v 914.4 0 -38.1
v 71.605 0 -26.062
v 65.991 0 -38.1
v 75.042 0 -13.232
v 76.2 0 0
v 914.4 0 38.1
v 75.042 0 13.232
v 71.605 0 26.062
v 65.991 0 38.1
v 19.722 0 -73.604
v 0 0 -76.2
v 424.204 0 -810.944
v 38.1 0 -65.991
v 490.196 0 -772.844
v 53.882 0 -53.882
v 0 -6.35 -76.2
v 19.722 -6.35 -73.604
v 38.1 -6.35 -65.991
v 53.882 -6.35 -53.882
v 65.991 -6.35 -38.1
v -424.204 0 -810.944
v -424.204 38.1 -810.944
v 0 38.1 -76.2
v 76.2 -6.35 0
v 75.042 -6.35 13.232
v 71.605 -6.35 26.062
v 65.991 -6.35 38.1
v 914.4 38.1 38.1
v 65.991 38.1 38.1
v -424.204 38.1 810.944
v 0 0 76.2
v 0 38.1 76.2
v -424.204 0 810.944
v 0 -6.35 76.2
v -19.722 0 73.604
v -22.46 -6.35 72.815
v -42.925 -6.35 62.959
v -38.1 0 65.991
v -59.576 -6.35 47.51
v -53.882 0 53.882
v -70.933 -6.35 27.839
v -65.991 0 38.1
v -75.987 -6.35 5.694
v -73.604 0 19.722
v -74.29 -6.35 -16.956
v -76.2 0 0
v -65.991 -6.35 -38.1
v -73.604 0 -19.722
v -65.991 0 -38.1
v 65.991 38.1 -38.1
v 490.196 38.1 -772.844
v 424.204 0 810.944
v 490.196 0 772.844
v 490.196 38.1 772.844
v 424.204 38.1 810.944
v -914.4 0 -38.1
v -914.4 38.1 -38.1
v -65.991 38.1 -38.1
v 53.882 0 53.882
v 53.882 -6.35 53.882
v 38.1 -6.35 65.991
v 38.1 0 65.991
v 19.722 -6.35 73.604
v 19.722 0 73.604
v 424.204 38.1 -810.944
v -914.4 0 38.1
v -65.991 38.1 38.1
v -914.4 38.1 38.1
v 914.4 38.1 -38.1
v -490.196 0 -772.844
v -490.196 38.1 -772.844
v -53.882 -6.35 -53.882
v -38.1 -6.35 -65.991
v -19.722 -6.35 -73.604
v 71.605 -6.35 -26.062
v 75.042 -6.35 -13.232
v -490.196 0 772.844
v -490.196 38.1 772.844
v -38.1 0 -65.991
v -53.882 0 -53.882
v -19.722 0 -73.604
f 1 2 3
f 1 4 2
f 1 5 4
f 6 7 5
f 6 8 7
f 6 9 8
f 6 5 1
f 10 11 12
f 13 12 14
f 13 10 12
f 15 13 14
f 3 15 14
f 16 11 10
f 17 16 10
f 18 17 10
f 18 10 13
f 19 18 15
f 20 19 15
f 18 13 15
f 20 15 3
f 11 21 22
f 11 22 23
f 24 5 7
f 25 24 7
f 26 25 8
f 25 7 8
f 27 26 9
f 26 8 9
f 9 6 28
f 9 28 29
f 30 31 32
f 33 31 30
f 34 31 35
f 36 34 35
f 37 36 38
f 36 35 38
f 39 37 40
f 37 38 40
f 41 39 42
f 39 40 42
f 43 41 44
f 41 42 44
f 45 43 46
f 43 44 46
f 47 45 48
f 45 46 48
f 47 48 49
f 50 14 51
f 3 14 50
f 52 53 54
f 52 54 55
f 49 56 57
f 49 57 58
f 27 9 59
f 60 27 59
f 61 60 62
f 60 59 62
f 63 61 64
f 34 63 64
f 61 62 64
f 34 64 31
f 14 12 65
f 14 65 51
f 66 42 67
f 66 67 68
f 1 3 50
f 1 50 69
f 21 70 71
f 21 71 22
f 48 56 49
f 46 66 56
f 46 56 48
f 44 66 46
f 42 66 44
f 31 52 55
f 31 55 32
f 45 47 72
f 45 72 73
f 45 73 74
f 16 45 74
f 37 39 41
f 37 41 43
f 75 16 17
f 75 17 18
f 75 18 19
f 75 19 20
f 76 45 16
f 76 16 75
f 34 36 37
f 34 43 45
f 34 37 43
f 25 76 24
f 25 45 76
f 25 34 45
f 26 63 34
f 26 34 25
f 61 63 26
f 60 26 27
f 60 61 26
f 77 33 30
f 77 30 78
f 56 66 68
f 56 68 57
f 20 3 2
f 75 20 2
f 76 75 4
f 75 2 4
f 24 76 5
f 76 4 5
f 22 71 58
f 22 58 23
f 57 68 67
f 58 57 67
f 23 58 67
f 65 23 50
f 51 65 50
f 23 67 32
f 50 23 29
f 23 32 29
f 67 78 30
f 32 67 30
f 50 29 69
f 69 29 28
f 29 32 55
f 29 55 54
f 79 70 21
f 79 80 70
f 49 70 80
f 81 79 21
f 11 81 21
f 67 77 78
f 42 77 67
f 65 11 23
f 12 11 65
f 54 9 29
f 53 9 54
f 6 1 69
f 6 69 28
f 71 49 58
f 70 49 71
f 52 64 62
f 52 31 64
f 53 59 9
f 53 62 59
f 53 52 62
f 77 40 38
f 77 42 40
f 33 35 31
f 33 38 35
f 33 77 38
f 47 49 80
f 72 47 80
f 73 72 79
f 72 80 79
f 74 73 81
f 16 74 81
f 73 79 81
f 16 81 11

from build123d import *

# Parameters (mm, degrees)
F1_DEPTH = 38.1
F3_DEPTH = 6.35


with BuildPart() as f1:
    # F0 (on Front) → F1 (new body)
    with BuildSketch(Plane.XZ):
        Polygon((21.9970452561, -38.1), (-21.9970452561, -38.1), (0, -76.2), (424.2044321158, -810.9436292205), (457.2, -791.8936292205), align=None)
        Polygon((65.9911357684, -38.1), (21.9970452561, -38.1), (457.2, -791.8936292205), (490.1955678842, -772.8436292205), align=None)
        Polygon((914.4, 0), (0, 0), (21.9970452561, -38.1), (65.9911357684, -38.1), (914.4, -38.1), align=None)
        Polygon((21.9970452561, 38.1), (0, 0), (914.4, 0), (914.4, 38.1), (65.9911357684, 38.1), align=None)
        Polygon((457.2, 791.8936292205), (21.9970452561, 38.1), (65.9911357684, 38.1), (490.1955678842, 772.8436292205), align=None)
        Polygon((0, 76.2), (21.9970452561, 38.1), (457.2, 791.8936292205), (424.2044321158, 810.9436292205), align=None)
        Polygon((-21.9970452561, 38.1), (21.9970452561, 38.1), (0, 76.2), (-424.2044321158, 810.9436292205), (-457.2, 791.8936292205), align=None)
        Polygon((-65.9911357684, 38.1), (-21.9970452561, 38.1), (-457.2, 791.8936292205), (-490.1955678842, 772.8436292205), align=None)
        Polygon((-21.9970452561, -38.1), (0, 0), (-914.4, 0), (-914.4, -38.1), (-65.9911357684, -38.1), align=None)
        Polygon((-914.4, 0), (0, 0), (-21.9970452561, 38.1), (-65.9911357684, 38.1), (-914.4, 38.1), align=None)
        Polygon((-457.2, -791.8936292205), (-21.9970452561, -38.1), (-65.9911357684, -38.1), (-490.1955678842, -772.8436292205), align=None)
        Polygon((0, -76.2), (-21.9970452561, -38.1), (-457.2, -791.8936292205), (-424.2044321158, -810.9436292205), align=None)
        Polygon((-21.9970452561, 38.1), (0, 0), (21.9970452561, 38.1), align=None)
        Polygon((21.9970452561, -38.1), (0, 0), (-21.9970452561, -38.1), align=None)
    extrude(amount=-F1_DEPTH)

    # F2 (on face) → F3 (join)
    with BuildSketch(Plane.XZ):
        with BuildLine():
            ThreePointArc((65.9911357684, -38.1), (73.6035479632, -19.7220112368), (76.2, 0))
            ThreePointArc((76.2, 0), (73.6035479632, 19.7220112368), (65.9911357684, 38.1))
            ThreePointArc((65.9911357684, 38.1), (38.1, 65.9911357684), (0, 76.2))
            ThreePointArc((0, 76.2), (-38.1, 65.9911357684), (-65.9911357684, 38.1))
            ThreePointArc((-65.9911357684, 38.1), (-76.2, 0), (-65.9911357684, -38.1))
            ThreePointArc((-65.9911357684, -38.1), (-38.1, -65.9911357684), (0, -76.2))
            ThreePointArc((0, -76.2), (38.1, -65.9911357684), (65.9911357684, -38.1))
        make_face()
    extrude(amount=F3_DEPTH)


solid = f1.part
